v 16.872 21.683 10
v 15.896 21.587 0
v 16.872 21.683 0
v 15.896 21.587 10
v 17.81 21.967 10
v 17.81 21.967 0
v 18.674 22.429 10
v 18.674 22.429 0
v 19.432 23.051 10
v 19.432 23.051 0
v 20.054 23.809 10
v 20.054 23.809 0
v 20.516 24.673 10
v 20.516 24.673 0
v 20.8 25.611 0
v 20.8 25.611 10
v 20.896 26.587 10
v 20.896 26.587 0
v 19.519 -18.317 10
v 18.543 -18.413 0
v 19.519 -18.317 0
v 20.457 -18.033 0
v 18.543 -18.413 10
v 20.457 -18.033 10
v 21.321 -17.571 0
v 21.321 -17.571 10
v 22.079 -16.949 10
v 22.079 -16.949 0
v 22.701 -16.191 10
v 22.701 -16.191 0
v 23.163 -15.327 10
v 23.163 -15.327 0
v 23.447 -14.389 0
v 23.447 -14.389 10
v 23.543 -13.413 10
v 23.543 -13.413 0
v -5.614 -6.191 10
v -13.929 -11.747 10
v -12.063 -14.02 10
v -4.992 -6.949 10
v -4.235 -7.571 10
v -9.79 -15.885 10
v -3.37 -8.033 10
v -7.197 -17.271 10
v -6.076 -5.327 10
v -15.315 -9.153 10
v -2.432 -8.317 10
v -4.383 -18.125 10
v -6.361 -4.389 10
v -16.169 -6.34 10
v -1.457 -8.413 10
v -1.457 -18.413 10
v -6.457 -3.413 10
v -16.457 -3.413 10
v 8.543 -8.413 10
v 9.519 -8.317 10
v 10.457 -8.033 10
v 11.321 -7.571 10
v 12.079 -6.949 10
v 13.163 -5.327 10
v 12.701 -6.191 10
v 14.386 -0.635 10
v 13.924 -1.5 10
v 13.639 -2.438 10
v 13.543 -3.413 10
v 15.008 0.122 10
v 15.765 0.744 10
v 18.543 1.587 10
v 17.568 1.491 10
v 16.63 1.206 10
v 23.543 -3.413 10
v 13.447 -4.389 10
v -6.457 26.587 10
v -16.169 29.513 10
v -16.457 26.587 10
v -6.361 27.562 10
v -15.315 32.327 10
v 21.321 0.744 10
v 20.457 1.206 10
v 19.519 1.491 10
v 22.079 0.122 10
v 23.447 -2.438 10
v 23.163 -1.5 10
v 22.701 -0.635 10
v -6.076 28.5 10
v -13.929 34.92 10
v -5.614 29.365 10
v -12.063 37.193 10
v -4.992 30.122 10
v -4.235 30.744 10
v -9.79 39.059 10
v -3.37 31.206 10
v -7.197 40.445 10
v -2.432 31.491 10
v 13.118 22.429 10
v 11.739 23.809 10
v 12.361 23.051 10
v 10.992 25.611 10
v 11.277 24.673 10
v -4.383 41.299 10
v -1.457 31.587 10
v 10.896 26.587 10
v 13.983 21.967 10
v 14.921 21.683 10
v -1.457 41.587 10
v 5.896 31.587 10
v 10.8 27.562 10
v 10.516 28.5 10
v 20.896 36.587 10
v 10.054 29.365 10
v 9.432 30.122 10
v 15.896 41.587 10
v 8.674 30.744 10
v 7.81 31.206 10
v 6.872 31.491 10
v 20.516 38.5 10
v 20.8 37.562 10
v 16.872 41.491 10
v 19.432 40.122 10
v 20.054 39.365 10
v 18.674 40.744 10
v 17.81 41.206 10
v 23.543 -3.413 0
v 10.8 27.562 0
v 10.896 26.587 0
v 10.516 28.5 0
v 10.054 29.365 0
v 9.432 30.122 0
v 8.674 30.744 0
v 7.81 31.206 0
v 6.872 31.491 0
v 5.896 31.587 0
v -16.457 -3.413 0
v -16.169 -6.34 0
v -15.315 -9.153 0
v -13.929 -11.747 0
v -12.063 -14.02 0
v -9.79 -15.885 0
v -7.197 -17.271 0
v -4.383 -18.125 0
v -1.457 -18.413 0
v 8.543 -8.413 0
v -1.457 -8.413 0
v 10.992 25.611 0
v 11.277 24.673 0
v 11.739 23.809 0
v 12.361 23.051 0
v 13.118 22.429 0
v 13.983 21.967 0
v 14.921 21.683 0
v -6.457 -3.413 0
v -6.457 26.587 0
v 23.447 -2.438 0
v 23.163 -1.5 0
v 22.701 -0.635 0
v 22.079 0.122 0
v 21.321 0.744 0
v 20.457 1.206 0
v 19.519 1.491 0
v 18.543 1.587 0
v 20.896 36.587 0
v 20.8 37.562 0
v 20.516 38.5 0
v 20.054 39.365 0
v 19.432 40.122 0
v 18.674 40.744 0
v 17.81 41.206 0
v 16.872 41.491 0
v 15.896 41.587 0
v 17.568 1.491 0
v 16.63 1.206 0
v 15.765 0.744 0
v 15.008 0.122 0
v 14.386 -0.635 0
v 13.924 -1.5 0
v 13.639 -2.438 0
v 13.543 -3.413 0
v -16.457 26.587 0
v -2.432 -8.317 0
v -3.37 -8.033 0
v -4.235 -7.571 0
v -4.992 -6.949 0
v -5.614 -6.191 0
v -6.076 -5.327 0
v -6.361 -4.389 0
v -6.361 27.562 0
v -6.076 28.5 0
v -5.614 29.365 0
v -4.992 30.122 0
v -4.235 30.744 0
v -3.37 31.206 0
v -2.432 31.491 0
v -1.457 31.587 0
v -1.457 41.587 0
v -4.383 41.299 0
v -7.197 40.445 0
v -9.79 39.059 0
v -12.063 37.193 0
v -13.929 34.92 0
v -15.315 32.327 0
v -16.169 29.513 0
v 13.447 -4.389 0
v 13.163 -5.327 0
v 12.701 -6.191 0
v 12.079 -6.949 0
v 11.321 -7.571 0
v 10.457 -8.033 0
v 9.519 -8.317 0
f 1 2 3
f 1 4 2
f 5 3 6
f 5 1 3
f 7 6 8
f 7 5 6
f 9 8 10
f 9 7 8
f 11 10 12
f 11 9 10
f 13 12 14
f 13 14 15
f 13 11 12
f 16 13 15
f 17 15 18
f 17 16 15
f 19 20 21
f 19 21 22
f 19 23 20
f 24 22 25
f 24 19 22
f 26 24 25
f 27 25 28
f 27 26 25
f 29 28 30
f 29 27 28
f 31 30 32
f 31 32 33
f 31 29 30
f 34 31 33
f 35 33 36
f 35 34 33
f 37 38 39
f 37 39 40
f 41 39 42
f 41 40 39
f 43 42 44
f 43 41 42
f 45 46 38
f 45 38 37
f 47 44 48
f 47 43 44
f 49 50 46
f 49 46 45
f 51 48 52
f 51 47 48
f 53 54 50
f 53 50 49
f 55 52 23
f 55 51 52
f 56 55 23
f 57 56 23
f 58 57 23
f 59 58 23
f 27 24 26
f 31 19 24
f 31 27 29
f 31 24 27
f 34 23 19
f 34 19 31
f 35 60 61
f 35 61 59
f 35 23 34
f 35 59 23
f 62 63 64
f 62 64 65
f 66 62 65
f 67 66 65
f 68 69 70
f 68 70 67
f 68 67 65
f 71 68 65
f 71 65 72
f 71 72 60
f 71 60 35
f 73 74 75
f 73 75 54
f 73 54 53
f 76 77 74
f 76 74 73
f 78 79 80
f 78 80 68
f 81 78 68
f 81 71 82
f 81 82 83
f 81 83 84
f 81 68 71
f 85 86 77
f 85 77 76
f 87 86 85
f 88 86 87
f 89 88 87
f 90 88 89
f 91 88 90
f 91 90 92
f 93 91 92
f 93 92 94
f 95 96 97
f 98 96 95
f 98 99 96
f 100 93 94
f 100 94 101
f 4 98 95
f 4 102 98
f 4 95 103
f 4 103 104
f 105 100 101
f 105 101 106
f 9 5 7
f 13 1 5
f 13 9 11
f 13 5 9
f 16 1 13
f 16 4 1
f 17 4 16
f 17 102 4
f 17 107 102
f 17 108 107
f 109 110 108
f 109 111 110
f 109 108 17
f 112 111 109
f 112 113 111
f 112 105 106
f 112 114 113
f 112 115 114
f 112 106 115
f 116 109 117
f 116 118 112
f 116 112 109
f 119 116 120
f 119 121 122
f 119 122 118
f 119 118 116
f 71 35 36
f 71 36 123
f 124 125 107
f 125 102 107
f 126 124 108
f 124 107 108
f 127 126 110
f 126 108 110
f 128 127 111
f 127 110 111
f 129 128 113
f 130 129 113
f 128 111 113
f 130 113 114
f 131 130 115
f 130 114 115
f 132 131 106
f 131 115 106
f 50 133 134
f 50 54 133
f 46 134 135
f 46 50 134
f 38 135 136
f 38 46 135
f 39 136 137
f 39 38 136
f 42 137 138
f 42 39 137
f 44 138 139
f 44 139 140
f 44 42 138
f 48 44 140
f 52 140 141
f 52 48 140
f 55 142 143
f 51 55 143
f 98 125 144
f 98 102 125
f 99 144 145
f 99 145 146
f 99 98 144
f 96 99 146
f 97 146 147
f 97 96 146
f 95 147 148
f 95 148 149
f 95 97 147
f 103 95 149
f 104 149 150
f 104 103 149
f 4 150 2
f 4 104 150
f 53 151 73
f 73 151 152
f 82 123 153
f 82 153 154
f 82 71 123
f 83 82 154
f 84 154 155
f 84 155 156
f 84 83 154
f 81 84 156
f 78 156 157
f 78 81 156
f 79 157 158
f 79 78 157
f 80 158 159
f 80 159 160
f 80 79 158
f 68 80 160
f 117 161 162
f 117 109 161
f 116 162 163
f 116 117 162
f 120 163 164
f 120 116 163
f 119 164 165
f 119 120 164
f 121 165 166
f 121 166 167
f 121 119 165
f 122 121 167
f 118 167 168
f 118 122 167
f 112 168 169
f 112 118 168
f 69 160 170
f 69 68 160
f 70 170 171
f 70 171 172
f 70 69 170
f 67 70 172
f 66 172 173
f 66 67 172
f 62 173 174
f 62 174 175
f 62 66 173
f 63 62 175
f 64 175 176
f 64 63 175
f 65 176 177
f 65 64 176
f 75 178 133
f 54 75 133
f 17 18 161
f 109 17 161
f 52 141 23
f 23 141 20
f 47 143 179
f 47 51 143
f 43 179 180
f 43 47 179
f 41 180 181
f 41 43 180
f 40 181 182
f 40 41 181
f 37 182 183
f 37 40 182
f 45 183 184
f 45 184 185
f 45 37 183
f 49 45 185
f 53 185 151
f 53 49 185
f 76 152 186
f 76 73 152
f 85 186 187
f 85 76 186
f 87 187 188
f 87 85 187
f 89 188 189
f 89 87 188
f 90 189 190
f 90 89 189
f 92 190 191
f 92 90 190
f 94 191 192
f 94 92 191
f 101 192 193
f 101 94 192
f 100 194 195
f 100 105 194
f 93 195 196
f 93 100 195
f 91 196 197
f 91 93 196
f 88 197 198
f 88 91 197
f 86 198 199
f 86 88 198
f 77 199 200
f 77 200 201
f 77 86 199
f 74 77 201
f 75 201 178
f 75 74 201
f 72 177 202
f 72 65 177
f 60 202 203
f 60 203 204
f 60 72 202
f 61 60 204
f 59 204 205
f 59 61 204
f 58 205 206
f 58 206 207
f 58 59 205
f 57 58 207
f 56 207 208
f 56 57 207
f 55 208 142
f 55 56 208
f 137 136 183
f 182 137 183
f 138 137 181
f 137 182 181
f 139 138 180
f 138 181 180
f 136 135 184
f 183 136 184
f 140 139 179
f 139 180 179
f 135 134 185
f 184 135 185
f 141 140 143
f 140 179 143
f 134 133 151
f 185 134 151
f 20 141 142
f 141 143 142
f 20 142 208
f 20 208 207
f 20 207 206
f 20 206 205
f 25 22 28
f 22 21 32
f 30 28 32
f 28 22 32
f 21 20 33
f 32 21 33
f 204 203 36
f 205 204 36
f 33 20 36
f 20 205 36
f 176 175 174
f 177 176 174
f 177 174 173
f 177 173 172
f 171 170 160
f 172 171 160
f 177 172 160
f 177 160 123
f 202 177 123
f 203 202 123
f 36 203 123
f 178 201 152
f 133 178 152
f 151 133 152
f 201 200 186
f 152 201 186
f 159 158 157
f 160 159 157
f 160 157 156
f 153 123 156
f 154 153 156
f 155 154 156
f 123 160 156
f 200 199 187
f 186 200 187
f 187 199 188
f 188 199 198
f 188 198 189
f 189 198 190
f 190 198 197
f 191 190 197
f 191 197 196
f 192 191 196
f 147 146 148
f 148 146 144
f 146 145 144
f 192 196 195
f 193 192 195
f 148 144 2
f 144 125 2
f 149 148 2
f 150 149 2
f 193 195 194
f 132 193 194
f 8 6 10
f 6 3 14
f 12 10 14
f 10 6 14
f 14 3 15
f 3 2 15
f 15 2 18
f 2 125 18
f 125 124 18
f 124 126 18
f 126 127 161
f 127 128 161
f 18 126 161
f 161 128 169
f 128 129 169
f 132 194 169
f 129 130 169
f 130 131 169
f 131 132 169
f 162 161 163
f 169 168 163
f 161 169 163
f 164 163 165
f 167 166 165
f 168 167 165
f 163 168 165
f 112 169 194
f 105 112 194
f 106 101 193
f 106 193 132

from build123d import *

# Parameters (mm, degrees)
F0_W     = 10
F0_H     = 10
F1_DEPTH = 10
F2_R     = 4.99999
F3_R     = 5
F4_R     = 5
F5_R     = 15


# Not quite as in the source:
# - a fillet or chamfer is up to 0.001 mm smaller than in the source, because OpenCascade refuses the exact size


with BuildPart() as f1:
    # F0 (on Top) → F1 (new body)
    with BuildSketch(Plane.XY):
        Polygon((10.8962109051, 41.5868479488), (10.8962109051, 31.5868479488), (10.8962109051, 21.5868479488), (20.8962109051, 21.5868479488), (20.8962109051, 41.5868479488), align=None)
        Polygon((-16.4567323537, 41.5868479488), (-16.4567323537, 31.5868479488), (-6.4567323537, 31.5868479488), (10.8962109051, 31.5868479488), (10.8962109051, 41.5868479488), align=None)
        Polygon((-6.4567323537, 31.5868479488), (-16.4567323537, 31.5868479488), (-16.4567323537, -18.4131520512), (-6.4567323537, -18.4131520512), (-6.4567323537, -8.4131520512), align=None)
        Polygon((13.5432676463, -8.4131520512), (-6.4567323537, -8.4131520512), (-6.4567323537, -18.4131520512), (23.5432676463, -18.4131520512), (23.5432676463, -8.4131520512), align=None)
        with Locations((18.5432676463, -3.4131520512)):
            Rectangle(F0_W, F0_H)
    extrude(amount=F1_DEPTH)

    # F2 (radius 5 in the source; OpenCascade refuses exactly that, so slightly less here)
    f2_edges = [f1.edges().sort_by_distance(p)[0] for p in [
        (13.543268, 1.586848, 5),
        (10.896211, 21.586848, 5),
        (10.896211, 31.586848, 5),
        (-6.456732, 31.586848, 5),
        (-6.456732, -8.413152, 5),
        (13.543268, -8.413152, 5),
    ]]
    fillet(f2_edges, radius=F2_R)

    # F3
    f3_edges = [f1.edges().sort_by_distance(p)[0] for p in [
        (23.543268, 1.586848, 5),
        (20.896211, 21.586848, 5),
    ]]
    fillet(f3_edges, radius=F3_R)

    # F4
    f4_edges = [f1.edges().sort_by_distance(p)[0] for p in [
        (23.543268, -18.413152, 5),
        (20.896211, 41.586848, 5),
    ]]
    fillet(f4_edges, radius=F4_R)

    # F5
    f5_edges = [f1.edges().sort_by_distance(p)[0] for p in [
        (-16.456732, -18.413152, 5),
        (-16.456732, 41.586848, 5),
    ]]
    fillet(f5_edges, radius=F5_R)


solid = f1.part
